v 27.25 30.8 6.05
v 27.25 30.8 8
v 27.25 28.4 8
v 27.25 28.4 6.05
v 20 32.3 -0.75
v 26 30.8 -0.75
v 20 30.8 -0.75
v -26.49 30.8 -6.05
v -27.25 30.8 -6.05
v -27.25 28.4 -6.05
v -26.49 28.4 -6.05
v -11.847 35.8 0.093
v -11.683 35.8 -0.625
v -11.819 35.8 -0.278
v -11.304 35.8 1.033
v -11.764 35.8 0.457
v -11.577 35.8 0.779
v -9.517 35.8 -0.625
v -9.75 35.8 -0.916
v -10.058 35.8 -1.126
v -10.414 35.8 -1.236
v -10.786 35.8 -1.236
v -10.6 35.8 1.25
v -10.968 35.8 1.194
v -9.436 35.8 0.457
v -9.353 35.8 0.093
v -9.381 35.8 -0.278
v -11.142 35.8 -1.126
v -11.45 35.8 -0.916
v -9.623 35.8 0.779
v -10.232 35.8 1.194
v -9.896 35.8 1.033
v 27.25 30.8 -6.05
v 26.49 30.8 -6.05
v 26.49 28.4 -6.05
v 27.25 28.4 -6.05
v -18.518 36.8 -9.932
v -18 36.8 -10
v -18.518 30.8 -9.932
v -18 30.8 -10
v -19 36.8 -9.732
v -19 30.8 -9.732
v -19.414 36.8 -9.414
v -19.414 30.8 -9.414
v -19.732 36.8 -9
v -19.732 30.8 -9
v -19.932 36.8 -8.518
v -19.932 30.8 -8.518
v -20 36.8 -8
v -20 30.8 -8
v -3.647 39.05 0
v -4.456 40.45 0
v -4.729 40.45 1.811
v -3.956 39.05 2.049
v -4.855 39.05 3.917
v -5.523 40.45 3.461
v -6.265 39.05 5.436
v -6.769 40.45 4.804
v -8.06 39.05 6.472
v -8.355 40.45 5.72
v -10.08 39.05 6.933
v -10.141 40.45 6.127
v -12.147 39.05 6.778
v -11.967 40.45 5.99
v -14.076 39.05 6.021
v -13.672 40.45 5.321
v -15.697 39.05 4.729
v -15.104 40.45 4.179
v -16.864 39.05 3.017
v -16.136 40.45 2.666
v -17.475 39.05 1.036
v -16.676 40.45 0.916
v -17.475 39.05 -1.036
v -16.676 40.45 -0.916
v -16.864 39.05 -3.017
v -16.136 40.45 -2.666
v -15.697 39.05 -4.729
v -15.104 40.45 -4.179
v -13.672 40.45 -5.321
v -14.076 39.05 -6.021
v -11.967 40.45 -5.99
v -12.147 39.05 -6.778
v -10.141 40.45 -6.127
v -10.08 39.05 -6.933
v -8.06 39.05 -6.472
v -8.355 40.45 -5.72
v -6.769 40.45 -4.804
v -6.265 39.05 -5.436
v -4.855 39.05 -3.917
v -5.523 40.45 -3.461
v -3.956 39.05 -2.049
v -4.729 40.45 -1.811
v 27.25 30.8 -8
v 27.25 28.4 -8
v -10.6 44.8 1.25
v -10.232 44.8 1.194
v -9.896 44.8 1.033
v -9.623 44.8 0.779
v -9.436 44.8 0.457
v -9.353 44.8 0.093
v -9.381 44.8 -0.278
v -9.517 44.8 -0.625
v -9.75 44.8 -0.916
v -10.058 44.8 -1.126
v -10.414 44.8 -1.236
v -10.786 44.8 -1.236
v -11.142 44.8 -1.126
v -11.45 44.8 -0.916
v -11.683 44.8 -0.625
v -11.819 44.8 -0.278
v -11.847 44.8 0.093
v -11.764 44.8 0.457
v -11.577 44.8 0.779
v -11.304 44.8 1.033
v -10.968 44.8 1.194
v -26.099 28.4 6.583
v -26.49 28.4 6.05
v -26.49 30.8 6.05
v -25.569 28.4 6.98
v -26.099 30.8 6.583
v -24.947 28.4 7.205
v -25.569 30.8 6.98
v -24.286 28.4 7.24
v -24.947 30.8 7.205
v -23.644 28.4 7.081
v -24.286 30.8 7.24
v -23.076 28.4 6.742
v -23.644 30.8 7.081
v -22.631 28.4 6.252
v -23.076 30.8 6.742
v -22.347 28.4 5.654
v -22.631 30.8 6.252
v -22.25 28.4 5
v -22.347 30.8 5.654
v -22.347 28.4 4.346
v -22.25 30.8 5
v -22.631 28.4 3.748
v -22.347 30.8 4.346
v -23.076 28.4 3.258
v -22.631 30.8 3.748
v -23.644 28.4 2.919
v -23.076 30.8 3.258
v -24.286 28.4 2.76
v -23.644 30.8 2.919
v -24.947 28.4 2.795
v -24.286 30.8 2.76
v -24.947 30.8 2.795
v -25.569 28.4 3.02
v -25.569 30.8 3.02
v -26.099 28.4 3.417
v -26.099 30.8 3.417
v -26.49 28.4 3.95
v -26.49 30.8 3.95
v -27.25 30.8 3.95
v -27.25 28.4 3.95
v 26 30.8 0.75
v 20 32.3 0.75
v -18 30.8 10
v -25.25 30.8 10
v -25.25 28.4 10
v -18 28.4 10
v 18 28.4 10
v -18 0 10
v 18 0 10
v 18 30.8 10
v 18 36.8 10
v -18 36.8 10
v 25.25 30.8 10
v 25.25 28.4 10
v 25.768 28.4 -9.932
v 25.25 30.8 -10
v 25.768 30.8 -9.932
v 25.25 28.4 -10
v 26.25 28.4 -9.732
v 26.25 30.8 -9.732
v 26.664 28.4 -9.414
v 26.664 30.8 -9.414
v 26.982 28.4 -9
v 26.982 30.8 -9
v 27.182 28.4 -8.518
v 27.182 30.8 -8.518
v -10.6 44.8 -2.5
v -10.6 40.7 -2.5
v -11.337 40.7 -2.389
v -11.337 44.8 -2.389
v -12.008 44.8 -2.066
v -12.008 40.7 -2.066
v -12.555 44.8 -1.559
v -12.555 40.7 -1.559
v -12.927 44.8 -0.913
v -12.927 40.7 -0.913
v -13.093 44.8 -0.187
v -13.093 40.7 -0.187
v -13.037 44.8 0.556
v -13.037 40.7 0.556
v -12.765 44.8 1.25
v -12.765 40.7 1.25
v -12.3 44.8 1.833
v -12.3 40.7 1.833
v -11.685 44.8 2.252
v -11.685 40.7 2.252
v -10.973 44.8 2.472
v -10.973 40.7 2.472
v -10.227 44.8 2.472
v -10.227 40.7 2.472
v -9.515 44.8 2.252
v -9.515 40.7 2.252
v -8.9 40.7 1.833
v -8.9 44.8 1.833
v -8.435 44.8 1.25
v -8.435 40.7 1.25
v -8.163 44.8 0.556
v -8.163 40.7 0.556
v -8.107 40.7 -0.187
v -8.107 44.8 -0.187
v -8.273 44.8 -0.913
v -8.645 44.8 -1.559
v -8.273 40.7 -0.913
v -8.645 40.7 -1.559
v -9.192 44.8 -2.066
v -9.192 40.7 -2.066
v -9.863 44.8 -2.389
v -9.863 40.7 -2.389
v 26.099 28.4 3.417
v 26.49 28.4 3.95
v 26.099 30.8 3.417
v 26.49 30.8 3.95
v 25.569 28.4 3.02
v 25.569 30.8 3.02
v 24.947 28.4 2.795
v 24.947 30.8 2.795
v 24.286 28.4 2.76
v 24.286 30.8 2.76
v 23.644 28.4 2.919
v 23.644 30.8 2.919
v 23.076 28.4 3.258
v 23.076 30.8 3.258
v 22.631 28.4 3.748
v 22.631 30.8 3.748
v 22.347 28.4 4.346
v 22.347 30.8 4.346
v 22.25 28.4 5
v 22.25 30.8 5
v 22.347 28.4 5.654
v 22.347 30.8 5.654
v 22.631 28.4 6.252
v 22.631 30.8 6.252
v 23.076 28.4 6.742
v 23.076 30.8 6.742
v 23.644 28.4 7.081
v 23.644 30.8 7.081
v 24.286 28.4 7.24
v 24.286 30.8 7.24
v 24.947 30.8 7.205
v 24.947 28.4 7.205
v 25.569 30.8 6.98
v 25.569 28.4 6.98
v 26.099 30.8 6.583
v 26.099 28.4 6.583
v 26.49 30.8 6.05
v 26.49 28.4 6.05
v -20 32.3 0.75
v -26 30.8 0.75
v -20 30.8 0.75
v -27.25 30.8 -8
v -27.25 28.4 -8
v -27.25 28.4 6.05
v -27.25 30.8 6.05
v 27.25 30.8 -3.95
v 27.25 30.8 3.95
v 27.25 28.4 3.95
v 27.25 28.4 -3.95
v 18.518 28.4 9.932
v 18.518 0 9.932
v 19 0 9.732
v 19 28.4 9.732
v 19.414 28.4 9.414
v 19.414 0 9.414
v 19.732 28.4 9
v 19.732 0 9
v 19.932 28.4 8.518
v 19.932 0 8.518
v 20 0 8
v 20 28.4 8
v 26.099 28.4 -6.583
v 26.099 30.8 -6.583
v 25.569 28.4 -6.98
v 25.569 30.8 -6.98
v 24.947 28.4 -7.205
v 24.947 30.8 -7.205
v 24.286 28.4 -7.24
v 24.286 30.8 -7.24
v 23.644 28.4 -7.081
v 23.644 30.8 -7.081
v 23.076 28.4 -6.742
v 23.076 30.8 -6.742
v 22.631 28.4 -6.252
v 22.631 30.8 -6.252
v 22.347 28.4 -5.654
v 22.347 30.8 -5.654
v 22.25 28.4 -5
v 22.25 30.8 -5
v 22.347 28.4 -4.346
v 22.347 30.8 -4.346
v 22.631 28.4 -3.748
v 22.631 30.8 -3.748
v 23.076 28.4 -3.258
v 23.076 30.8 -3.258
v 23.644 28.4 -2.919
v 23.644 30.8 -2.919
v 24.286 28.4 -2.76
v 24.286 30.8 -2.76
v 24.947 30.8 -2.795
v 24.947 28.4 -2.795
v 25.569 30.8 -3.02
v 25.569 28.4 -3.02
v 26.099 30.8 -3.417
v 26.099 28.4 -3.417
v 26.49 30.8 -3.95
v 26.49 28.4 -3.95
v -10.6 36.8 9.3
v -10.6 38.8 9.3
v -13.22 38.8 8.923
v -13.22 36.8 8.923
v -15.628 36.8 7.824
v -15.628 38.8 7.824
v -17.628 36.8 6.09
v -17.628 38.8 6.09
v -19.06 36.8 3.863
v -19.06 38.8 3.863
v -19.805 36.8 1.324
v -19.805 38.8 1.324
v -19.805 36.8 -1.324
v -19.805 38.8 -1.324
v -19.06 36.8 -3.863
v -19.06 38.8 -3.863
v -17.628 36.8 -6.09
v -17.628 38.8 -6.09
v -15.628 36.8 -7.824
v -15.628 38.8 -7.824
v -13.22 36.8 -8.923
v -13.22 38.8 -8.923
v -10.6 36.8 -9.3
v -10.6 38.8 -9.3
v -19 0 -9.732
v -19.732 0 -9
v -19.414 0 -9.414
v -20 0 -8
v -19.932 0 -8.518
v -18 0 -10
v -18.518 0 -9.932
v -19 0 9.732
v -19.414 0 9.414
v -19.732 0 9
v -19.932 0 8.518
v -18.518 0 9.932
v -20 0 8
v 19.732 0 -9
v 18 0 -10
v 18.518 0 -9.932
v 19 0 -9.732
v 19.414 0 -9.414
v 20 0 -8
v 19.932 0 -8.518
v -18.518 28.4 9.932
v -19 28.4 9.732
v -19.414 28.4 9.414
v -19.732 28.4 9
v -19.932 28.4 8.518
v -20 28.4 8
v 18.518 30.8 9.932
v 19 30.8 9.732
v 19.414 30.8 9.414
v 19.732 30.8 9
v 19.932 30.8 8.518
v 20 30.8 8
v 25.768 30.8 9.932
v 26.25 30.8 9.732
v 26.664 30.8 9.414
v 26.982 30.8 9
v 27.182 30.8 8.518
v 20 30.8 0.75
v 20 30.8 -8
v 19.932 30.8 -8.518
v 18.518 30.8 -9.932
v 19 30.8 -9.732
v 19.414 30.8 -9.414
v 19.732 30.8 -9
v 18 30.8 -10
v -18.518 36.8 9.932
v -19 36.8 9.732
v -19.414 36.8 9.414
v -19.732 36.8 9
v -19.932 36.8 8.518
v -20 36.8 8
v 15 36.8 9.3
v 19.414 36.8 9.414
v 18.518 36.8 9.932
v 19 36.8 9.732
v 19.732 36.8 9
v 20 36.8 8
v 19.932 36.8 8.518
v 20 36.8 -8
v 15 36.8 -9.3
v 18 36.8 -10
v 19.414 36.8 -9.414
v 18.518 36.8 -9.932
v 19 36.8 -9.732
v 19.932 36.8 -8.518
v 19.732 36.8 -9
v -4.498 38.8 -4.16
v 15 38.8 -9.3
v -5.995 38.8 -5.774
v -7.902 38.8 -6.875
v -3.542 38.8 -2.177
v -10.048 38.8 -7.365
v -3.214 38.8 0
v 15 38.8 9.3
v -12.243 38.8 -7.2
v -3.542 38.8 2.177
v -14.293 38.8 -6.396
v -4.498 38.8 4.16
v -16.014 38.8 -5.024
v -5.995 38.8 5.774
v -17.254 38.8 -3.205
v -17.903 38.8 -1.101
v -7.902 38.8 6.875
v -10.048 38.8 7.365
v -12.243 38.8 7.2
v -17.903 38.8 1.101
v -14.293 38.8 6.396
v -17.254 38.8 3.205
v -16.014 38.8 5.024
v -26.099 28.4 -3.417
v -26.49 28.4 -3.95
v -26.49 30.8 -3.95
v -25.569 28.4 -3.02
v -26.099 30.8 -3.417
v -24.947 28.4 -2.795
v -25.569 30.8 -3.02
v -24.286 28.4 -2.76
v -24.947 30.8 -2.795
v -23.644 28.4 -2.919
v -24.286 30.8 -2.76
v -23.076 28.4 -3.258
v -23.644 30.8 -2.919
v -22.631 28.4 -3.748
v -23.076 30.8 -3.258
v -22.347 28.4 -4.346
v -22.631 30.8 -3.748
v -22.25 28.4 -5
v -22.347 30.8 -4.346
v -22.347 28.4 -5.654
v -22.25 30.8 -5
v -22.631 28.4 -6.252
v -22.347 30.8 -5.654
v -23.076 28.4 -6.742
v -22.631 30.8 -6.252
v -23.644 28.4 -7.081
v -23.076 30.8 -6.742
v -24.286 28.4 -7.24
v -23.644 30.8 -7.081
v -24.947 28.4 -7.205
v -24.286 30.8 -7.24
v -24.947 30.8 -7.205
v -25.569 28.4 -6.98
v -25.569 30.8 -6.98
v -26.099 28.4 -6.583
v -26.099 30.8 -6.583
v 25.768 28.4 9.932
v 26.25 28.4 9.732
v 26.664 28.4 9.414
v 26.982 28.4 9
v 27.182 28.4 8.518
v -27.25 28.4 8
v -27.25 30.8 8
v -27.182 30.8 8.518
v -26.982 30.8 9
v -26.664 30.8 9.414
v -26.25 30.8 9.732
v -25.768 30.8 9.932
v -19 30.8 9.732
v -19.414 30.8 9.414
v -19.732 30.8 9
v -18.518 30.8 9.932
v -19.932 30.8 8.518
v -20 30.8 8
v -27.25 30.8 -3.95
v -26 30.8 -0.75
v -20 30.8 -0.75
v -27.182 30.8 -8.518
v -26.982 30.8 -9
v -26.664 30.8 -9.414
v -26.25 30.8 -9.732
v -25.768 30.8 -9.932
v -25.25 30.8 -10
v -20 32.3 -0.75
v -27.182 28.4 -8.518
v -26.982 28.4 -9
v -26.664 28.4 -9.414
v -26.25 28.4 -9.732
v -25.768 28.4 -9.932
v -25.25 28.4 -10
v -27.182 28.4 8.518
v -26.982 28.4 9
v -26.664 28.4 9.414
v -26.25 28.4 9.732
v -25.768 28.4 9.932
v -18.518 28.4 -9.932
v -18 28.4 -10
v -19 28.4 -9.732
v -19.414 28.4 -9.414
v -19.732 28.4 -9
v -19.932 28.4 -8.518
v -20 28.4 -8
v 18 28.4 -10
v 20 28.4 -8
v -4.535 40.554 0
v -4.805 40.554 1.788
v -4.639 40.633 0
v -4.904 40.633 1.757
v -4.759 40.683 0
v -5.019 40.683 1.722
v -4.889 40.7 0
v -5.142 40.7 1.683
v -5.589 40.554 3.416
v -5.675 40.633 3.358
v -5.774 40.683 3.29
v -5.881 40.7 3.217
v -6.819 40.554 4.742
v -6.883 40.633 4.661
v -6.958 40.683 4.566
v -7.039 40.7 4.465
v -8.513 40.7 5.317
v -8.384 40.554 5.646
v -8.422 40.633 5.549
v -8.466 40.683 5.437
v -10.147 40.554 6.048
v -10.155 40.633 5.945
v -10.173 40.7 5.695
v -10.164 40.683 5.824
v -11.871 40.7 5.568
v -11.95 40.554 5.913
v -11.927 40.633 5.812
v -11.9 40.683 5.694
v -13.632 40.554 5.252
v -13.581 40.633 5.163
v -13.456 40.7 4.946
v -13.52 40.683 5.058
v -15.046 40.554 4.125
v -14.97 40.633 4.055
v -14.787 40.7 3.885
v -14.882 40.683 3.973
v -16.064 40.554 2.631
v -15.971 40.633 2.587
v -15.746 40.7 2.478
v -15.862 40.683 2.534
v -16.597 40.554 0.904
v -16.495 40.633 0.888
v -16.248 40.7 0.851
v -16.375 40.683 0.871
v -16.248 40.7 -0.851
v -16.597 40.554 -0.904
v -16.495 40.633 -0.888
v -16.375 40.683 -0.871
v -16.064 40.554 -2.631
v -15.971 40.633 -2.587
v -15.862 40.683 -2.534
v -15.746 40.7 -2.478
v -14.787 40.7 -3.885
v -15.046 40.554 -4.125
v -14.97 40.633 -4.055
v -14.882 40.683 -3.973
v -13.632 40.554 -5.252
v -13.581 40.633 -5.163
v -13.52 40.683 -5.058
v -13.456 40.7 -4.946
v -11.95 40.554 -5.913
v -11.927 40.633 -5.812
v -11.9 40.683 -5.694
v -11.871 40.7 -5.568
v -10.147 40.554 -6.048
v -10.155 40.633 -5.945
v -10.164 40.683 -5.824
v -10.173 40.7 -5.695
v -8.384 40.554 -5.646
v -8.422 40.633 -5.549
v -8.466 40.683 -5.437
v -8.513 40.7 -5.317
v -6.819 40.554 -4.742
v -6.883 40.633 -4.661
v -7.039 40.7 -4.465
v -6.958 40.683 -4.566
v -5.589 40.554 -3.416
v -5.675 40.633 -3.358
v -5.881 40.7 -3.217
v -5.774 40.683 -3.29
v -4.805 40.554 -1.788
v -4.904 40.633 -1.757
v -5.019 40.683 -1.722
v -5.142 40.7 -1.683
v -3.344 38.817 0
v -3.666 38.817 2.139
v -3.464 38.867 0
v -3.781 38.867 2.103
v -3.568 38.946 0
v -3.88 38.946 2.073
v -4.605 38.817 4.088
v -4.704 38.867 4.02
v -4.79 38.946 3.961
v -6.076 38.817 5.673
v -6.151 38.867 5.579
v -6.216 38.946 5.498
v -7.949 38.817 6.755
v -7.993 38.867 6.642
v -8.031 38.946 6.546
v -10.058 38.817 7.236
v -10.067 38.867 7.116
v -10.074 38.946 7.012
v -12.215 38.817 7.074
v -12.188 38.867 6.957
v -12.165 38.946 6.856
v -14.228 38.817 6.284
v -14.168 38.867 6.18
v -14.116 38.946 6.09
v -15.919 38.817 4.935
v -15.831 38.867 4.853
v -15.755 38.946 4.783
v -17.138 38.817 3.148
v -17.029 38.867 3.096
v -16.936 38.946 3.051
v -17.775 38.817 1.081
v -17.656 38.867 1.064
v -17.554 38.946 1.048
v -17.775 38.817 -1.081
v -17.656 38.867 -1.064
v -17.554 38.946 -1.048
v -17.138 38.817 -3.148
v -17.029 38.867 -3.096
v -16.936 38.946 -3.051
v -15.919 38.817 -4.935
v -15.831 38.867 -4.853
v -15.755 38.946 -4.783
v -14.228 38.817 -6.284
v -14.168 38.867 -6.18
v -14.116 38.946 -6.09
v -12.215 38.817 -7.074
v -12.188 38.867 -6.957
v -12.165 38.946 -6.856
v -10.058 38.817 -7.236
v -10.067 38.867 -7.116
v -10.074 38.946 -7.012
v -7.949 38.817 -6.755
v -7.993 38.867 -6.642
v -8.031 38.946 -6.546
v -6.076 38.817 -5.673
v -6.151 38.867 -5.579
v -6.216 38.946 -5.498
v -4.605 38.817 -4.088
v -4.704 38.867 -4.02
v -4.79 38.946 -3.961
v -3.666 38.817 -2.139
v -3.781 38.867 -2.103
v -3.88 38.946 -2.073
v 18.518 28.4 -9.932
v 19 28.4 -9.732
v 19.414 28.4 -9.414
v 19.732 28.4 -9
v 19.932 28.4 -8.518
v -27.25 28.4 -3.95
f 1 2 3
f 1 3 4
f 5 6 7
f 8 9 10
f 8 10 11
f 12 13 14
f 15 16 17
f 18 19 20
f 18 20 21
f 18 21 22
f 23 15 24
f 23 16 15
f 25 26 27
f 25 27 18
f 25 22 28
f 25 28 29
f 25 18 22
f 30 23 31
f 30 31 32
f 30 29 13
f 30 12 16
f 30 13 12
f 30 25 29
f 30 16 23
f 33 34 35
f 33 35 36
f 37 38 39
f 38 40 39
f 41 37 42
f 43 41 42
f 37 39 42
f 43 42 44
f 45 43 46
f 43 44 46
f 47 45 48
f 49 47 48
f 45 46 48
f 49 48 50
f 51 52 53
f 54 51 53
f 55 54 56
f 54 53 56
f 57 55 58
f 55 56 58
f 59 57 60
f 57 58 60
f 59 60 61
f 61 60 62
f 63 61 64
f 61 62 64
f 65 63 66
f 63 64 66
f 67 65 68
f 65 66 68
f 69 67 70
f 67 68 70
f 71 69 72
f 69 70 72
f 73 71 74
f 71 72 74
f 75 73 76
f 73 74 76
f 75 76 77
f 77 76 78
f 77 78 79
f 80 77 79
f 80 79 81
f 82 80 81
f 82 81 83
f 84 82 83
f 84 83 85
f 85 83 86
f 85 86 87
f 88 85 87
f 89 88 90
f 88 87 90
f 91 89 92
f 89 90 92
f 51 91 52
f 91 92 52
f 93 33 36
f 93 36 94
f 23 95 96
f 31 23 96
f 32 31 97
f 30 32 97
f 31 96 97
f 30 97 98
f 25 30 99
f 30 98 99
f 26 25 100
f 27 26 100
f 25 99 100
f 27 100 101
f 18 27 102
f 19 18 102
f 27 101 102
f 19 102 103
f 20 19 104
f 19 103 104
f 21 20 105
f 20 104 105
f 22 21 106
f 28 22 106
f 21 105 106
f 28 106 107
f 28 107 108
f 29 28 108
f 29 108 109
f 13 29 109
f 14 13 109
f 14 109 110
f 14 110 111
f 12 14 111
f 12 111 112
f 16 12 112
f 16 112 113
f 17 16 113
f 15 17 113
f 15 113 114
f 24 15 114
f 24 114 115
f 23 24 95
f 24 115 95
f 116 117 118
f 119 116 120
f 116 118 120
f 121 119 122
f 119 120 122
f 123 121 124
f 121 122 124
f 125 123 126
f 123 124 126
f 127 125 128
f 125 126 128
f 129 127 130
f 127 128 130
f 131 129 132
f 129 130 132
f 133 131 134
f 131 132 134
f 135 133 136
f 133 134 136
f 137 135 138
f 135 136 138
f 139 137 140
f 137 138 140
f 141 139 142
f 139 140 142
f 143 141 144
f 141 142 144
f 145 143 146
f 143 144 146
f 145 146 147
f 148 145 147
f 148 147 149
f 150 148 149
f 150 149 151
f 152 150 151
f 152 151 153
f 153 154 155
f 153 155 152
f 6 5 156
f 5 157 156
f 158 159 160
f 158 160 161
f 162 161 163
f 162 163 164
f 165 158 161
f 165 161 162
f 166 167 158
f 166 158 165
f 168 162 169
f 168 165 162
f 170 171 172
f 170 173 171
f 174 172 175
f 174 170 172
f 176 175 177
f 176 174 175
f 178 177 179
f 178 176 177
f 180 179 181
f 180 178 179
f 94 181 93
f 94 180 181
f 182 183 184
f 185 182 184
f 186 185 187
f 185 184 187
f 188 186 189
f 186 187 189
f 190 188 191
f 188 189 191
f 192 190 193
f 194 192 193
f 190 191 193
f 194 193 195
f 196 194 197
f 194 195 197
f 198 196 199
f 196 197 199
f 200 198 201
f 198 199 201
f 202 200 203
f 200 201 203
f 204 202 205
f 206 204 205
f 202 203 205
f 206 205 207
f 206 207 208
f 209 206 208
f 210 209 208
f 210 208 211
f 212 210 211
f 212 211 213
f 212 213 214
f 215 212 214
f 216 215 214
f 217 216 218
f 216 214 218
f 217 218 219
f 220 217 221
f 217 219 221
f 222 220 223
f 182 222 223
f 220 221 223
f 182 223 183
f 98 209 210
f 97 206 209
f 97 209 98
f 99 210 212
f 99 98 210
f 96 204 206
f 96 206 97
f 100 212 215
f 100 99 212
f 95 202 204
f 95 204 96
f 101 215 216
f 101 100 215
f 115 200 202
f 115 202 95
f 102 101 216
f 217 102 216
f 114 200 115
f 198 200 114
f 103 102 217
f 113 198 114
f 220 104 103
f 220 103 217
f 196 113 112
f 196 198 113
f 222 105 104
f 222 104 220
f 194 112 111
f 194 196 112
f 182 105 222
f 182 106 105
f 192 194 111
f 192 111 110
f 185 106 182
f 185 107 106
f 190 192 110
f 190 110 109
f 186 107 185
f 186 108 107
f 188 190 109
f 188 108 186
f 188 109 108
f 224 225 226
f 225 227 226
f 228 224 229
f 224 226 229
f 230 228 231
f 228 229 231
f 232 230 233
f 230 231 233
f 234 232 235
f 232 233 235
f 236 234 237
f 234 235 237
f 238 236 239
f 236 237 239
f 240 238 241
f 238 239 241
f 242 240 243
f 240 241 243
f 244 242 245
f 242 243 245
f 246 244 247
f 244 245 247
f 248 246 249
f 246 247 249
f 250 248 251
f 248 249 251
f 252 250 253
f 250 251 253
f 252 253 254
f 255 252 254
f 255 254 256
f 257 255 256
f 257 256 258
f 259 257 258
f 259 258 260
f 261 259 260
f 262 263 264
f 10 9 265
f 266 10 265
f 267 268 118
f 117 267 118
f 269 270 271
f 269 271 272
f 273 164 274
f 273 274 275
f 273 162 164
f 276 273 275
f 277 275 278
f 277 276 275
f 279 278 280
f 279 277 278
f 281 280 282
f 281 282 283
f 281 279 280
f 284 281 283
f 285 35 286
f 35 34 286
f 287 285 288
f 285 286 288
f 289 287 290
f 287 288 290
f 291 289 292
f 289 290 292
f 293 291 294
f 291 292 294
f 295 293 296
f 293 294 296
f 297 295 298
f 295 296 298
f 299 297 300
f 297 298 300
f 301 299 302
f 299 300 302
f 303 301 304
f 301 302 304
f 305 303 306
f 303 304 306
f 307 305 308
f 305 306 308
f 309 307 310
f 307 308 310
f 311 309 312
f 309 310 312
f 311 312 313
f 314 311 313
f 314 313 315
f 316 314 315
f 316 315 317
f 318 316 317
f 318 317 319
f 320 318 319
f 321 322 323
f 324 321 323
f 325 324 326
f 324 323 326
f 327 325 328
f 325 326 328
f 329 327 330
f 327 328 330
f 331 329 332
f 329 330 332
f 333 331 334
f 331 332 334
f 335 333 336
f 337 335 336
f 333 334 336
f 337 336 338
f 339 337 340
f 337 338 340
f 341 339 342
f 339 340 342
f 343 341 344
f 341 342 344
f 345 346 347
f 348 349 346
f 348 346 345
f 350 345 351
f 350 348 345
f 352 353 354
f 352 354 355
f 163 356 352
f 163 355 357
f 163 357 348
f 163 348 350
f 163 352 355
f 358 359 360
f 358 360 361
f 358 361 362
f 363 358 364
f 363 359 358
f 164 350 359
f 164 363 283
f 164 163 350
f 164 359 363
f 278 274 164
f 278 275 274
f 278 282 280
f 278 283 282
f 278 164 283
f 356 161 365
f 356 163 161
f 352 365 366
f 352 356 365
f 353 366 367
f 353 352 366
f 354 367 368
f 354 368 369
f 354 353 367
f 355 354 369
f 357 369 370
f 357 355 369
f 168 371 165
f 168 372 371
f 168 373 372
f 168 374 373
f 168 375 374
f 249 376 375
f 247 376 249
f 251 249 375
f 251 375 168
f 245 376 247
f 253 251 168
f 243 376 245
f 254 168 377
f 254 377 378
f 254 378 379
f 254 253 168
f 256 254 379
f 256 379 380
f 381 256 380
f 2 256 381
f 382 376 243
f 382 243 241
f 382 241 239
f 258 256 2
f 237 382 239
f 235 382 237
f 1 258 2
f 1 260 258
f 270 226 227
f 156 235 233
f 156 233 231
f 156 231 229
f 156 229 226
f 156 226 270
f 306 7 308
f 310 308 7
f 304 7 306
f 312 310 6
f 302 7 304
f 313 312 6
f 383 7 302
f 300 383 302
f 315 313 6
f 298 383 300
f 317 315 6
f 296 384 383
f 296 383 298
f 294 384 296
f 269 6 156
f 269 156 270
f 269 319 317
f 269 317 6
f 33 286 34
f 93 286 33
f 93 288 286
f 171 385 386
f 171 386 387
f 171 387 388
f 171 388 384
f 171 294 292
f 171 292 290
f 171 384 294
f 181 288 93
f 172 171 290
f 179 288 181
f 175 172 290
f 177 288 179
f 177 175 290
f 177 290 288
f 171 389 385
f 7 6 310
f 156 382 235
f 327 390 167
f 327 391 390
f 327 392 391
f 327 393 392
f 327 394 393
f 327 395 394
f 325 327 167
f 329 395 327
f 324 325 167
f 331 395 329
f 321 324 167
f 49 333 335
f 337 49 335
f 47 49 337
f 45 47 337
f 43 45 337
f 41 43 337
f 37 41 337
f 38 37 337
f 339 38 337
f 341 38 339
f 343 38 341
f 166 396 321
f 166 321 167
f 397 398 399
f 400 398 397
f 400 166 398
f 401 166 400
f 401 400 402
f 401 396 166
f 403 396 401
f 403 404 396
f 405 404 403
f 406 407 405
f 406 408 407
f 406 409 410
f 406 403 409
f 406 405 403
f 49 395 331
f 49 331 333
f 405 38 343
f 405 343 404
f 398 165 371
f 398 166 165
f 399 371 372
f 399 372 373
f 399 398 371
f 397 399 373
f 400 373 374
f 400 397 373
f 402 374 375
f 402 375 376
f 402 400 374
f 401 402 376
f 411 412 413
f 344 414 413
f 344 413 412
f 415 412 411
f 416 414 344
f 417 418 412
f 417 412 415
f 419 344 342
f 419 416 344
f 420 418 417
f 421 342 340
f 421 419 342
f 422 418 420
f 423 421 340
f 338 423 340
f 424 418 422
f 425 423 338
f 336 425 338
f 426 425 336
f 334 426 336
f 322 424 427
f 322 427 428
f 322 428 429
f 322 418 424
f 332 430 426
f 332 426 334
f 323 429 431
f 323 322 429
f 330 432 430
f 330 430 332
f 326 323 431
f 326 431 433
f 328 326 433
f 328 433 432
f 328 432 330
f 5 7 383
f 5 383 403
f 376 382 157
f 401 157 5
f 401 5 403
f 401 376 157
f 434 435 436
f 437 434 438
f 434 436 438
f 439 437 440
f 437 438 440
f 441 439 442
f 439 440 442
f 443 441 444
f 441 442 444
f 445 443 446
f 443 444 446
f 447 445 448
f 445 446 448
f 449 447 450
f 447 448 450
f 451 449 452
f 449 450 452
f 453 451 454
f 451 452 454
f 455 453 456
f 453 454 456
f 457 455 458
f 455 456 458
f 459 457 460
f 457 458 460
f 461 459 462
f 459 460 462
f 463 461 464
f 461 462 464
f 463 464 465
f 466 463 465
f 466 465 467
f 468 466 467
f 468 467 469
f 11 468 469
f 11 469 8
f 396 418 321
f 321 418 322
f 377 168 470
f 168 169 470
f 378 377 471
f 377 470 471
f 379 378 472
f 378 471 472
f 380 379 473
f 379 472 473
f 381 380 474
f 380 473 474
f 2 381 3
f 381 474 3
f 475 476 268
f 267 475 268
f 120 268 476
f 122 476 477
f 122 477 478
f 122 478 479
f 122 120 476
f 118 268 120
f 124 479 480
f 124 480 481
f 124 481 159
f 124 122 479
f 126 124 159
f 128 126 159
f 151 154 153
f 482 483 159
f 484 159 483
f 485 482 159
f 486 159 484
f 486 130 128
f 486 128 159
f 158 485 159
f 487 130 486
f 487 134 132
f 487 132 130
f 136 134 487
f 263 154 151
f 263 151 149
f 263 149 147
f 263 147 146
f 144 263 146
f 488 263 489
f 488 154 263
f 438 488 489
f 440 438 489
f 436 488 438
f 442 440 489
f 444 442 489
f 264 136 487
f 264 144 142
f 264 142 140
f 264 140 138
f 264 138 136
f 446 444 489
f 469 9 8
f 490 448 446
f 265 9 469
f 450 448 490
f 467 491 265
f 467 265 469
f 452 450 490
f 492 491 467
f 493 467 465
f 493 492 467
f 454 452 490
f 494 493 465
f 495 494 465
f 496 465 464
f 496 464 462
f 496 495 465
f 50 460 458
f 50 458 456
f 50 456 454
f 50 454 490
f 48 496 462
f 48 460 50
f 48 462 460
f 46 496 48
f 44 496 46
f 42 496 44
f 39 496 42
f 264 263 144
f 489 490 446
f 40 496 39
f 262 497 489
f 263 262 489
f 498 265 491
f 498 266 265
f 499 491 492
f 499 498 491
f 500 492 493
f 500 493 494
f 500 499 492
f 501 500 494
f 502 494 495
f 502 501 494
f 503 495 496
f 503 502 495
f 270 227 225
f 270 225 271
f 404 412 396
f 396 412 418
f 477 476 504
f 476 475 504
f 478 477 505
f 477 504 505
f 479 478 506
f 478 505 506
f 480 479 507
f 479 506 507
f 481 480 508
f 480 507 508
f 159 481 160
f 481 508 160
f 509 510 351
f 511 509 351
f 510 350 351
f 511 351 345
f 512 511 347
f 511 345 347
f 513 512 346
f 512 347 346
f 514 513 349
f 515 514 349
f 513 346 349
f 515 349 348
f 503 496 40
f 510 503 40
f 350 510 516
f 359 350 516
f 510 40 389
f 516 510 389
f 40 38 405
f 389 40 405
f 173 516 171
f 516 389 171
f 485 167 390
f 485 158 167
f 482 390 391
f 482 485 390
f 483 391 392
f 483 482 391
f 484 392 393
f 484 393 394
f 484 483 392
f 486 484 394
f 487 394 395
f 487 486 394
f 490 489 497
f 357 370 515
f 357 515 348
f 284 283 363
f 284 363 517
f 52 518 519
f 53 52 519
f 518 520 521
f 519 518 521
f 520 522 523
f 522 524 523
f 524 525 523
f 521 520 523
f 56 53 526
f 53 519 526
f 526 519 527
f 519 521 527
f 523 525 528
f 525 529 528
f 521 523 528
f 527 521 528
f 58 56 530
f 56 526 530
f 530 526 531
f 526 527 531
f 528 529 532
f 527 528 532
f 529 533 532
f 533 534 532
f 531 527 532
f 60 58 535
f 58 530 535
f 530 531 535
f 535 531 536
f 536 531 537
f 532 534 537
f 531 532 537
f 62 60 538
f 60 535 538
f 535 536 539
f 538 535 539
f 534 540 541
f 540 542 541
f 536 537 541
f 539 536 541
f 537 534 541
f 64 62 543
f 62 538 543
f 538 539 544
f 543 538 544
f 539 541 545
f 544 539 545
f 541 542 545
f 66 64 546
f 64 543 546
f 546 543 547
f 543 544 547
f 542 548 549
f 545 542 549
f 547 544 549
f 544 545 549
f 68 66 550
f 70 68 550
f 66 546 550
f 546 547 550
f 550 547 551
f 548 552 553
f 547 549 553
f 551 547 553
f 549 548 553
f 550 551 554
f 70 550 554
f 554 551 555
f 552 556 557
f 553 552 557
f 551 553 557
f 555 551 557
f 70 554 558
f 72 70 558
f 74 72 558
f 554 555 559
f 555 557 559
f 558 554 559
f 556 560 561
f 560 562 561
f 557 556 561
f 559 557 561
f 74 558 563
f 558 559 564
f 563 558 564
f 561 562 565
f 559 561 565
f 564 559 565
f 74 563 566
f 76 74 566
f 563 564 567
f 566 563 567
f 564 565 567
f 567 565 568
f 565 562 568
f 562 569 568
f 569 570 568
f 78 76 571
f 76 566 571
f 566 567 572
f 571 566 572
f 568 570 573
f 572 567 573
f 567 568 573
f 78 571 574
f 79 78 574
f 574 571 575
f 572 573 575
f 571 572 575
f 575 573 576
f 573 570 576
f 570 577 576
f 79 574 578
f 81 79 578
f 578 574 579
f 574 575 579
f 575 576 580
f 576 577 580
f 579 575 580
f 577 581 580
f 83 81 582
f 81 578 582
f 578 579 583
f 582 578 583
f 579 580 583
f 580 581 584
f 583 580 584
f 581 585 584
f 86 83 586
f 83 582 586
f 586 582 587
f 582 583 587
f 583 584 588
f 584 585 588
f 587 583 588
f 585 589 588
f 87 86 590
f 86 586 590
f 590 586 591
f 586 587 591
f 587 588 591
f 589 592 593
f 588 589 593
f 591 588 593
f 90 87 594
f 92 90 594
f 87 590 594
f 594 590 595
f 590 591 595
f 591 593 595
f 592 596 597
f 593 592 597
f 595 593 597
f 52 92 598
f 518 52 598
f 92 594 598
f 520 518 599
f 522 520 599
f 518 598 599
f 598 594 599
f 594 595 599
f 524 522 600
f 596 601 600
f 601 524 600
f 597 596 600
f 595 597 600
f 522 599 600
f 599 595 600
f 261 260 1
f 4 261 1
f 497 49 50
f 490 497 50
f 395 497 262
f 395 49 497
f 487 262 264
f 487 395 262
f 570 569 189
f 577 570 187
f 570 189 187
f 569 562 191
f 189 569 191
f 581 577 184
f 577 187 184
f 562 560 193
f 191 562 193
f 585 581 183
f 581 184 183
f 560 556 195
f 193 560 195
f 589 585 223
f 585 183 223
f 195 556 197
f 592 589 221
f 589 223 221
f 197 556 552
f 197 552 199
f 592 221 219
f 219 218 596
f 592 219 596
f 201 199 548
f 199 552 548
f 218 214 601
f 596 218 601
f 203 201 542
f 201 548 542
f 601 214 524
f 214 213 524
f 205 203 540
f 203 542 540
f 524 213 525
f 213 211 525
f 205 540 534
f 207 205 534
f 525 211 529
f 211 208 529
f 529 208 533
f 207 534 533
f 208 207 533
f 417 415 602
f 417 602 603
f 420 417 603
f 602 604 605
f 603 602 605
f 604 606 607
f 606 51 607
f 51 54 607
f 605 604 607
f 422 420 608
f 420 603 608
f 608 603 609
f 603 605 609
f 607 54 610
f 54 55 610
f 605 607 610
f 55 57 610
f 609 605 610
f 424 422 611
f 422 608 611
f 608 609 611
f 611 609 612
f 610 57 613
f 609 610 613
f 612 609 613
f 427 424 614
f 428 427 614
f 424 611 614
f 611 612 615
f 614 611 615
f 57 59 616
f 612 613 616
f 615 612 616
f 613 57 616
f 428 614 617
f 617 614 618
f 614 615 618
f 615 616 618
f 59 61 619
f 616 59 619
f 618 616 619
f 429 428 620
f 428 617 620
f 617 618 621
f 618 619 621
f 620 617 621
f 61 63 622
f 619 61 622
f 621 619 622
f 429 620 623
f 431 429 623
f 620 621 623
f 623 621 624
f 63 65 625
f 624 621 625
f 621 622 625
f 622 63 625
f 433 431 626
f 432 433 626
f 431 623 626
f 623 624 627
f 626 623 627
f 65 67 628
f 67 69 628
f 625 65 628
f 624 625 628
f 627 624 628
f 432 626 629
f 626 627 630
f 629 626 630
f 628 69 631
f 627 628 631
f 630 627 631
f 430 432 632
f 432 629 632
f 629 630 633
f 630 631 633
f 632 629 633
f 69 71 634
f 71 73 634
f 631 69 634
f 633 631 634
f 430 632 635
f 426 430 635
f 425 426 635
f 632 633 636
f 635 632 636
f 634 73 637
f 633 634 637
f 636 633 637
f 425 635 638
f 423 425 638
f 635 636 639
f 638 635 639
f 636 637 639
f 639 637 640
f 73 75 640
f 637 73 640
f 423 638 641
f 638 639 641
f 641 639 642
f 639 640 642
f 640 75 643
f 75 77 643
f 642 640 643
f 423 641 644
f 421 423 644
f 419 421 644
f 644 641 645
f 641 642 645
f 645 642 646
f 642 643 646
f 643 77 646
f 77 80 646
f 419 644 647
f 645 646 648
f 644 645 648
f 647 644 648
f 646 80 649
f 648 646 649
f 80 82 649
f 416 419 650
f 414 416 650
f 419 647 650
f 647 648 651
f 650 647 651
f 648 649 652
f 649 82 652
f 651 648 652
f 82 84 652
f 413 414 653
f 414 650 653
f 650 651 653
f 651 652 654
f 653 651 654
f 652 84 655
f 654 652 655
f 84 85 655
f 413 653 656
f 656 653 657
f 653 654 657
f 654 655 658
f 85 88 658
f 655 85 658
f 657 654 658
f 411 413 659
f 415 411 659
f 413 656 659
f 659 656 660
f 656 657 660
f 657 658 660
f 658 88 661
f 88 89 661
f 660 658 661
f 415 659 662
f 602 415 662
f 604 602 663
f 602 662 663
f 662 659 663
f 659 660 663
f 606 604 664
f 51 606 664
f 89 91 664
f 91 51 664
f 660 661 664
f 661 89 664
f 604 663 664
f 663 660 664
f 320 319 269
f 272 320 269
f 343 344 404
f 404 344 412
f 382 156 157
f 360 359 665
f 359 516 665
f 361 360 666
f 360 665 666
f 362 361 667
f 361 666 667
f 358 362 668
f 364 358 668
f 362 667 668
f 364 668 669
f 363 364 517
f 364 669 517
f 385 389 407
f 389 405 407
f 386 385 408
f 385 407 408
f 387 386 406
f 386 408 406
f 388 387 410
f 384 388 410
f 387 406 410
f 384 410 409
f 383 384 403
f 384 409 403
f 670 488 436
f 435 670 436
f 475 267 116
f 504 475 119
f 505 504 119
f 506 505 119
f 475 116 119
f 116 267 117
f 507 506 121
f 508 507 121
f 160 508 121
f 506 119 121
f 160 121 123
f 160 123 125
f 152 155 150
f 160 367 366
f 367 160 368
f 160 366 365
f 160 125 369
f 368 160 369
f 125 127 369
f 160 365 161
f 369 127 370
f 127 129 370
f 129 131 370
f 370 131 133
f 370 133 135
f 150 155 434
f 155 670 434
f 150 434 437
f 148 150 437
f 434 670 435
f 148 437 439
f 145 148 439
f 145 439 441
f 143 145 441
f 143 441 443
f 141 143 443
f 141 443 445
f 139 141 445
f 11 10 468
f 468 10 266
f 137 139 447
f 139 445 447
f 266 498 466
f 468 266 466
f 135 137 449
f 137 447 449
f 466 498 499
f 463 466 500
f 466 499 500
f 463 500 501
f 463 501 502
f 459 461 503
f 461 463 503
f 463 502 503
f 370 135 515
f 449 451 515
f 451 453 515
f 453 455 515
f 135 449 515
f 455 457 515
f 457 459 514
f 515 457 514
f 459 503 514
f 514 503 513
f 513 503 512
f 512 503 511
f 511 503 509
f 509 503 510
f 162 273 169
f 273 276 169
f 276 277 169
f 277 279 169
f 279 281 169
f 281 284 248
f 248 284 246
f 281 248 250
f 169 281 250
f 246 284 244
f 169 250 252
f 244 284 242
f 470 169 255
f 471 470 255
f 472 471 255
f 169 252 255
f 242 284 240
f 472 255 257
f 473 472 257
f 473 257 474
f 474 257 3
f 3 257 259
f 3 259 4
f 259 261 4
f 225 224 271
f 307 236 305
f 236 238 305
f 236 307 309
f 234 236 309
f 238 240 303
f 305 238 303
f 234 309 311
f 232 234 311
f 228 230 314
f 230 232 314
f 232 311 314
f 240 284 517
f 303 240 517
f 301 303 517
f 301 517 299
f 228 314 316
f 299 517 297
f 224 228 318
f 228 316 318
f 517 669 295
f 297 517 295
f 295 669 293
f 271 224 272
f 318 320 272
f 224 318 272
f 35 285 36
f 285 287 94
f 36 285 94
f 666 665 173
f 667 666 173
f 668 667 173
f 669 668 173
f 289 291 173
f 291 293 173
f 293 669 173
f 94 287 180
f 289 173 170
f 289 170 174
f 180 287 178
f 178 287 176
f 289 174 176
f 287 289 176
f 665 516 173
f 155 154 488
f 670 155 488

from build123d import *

# Parameters (mm, degrees)
EXTRUDE_1_DEPTH     = 10
EXTRUDE_START       = 30.8
SKETCH_4_W          = 54.5
SKETCH_4_H          = 20
EXTRUDE_2_DEPTH     = 2.4
SKETCH_5_R          = 2.25
CUT_EXTRUDE_1_DEPTH = 3.1
SKETCH_6_W          = 2
SKETCH_6_H          = 2.1
CUT_EXTRUDE_2_DEPTH = 3.1
SKETCH_8_R          = 6
EXTRUDE_3_DEPTH     = 1.9
EXTRUDE_3_DRAFT     = -30
SKETCH_9_R          = 2.5
EXTRUDE_4_DEPTH     = 4.1
SKETCH_10_R         = 1.25
CUT_EXTRUDE_3_DEPTH = 9
EXTRUDE_5_DEPTH     = 0.75
SKETCH_12_W         = 40
SKETCH_12_H         = 20
CUT_EXTRUDE_5_DEPTH = 2
FILLET_1_R          = 2
FILLET_2_R          = 0.5


with BuildPart() as part:
    # 草图3 → 凸台-拉伸1 (new, symmetric)
    with BuildSketch(Plane.XY):
        Polygon((-20, 0), (20, 0), (20, 35.1), (20, 38.8), (16, 38.8), (-13.8, 38.8), (-20, 38.8), (-20, 34.4), align=None)
    extrude(amount=EXTRUDE_1_DEPTH, both=True)

    # 草图4 → 凸台-拉伸2 (add)
    with BuildSketch(Plane(origin=(0, 0, 0), x_dir=(1, 0, 0), z_dir=(0, 1, 0)).offset(EXTRUDE_START)):
        Rectangle(SKETCH_4_W, SKETCH_4_H)
    extrude(amount=-EXTRUDE_2_DEPTH)

    # 草图5 → 切除-拉伸1 (cut)
    with BuildSketch(Plane(origin=(0, 30.8, 0), x_dir=(1, 0, 0), z_dir=(0, 1, 0))):
        with Locations(Location((-24.5, 5, 0), (0, 0, 270))):
            Circle(SKETCH_5_R)
        with Locations(Location((24.5, 5, 0), (0, 0, 270))):
            Circle(SKETCH_5_R)
        with Locations(Location((24.5, -5, 0), (0, 0, 270))):
            Circle(SKETCH_5_R)
        with Locations(Location((-24.5, -5, 0), (0, 0, 270))):
            Circle(SKETCH_5_R)
    extrude(amount=-CUT_EXTRUDE_1_DEPTH, mode=Mode.SUBTRACT)

    # 草图6 → 切除-拉伸2 (cut)
    with BuildSketch(Plane(origin=(0, 30.8, 0), x_dir=(1, 0, 0), z_dir=(0, 1, 0))):
        with Locations((-26.25, 5)):
            Rectangle(SKETCH_6_W, SKETCH_6_H)
        with Locations((26.25, 5)):
            Rectangle(SKETCH_6_W, SKETCH_6_H)
        with Locations((26.25, -5)):
            Rectangle(SKETCH_6_W, SKETCH_6_H)
        with Locations((-26.25, -5)):
            Rectangle(SKETCH_6_W, SKETCH_6_H)
    extrude(amount=-CUT_EXTRUDE_2_DEPTH, mode=Mode.SUBTRACT)


with BuildPart() as extrude_3_tool:
    # 草图8 → 凸台-拉伸3 (with draft: the straight prism first)
    with BuildSketch(Plane.XZ.offset(-40.7)):
        with Locations((-10.6, 0)):
            Circle(SKETCH_8_R)
    extrude(amount=EXTRUDE_3_DEPTH)
    # 凸台-拉伸3: the draft: its side faces are tilted about the plane it starts from
    extrude_3_sides = [extrude_3_tool.faces().sort_by_distance(p)[0] for p in [
        (-16.6, 39.75, 0),
    ]]
    draft(extrude_3_sides, Plane.XZ.offset(-40.7), EXTRUDE_3_DRAFT)


with BuildPart() as part_1:
    add(part.part)

    # 凸台-拉伸3: add extrude_3_tool
    add(extrude_3_tool.part)

    # 草图9 → 凸台-拉伸4 (add)
    with BuildSketch(Plane(origin=(0, 40.7, 0), x_dir=(1, 0, 0), z_dir=(0, 1, 0))):
        with Locations(Location((-10.6, 0, 0), (0, 0, 90))):
            Circle(SKETCH_9_R)
    extrude(amount=EXTRUDE_4_DEPTH)

    # 草图10 → 切除-拉伸3 (cut)
    with BuildSketch(Plane(origin=(0, 44.8, 0), x_dir=(1, 0, 0), z_dir=(0, 1, 0))):
        with Locations(Location((-10.6, 0, 0), (0, 0, 270))):
            Circle(SKETCH_10_R)
    extrude(amount=-CUT_EXTRUDE_3_DEPTH, mode=Mode.SUBTRACT)

    # 草图11 → 凸台-拉伸5 (add, symmetric)
    with BuildSketch(Plane.XY):
        Polygon((-20, 32.3), (-26, 30.8), (-20, 30.8), align=None)
        Polygon((20, 30.8), (20, 32.3), (26, 30.8), align=None)
    extrude(amount=EXTRUDE_5_DEPTH, both=True)

    # 草图12 → 切除-拉伸5 (cut)
    with BuildSketch(Plane(origin=(0, 38.8, 0), x_dir=(1, 0, 0), z_dir=(0, 1, 0))):
        Rectangle(SKETCH_12_W, SKETCH_12_H)
        with BuildLine():
            Line((-10.6, 9.3), (15, 9.3))
            Line((15, 9.3), (15, -9.3))
            Line((15, -9.3), (-10.6, -9.3))
            ThreePointArc((-10.6, -9.3), (-19.9, 0), (-10.6, 9.3))
        make_face(mode=Mode.SUBTRACT)
    extrude(amount=-CUT_EXTRUDE_5_DEPTH, mode=Mode.SUBTRACT)

    # 圆角1
    fillet_1_edges = [part_1.edges().sort_by_distance(p)[0] for p in [
        (20, 14.2, 10),
        (-20, 33.8, -10),
        (-20, 33.8, 10),
        (-20, 14.2, -10),
        (20, 33.8, -10),
        (-20, 14.2, 10),
        (20, 33.8, 10),
        (27.25, 29.6, 10),
        (-27.25, 29.6, -10),
        (27.25, 29.6, -10),
        (-27.25, 29.6, 10),
        (20, 14.2, -10),
    ]]
    fillet(fillet_1_edges, radius=FILLET_1_R)

    # 圆角2
    fillet_2_edges = [part_1.edges().sort_by_distance(p)[0] for p in [
        (-17.696965511, 38.8, 0),
        (-16.6, 40.7, 0),
    ]]
    fillet(fillet_2_edges, radius=FILLET_2_R)


solid = part_1.part
